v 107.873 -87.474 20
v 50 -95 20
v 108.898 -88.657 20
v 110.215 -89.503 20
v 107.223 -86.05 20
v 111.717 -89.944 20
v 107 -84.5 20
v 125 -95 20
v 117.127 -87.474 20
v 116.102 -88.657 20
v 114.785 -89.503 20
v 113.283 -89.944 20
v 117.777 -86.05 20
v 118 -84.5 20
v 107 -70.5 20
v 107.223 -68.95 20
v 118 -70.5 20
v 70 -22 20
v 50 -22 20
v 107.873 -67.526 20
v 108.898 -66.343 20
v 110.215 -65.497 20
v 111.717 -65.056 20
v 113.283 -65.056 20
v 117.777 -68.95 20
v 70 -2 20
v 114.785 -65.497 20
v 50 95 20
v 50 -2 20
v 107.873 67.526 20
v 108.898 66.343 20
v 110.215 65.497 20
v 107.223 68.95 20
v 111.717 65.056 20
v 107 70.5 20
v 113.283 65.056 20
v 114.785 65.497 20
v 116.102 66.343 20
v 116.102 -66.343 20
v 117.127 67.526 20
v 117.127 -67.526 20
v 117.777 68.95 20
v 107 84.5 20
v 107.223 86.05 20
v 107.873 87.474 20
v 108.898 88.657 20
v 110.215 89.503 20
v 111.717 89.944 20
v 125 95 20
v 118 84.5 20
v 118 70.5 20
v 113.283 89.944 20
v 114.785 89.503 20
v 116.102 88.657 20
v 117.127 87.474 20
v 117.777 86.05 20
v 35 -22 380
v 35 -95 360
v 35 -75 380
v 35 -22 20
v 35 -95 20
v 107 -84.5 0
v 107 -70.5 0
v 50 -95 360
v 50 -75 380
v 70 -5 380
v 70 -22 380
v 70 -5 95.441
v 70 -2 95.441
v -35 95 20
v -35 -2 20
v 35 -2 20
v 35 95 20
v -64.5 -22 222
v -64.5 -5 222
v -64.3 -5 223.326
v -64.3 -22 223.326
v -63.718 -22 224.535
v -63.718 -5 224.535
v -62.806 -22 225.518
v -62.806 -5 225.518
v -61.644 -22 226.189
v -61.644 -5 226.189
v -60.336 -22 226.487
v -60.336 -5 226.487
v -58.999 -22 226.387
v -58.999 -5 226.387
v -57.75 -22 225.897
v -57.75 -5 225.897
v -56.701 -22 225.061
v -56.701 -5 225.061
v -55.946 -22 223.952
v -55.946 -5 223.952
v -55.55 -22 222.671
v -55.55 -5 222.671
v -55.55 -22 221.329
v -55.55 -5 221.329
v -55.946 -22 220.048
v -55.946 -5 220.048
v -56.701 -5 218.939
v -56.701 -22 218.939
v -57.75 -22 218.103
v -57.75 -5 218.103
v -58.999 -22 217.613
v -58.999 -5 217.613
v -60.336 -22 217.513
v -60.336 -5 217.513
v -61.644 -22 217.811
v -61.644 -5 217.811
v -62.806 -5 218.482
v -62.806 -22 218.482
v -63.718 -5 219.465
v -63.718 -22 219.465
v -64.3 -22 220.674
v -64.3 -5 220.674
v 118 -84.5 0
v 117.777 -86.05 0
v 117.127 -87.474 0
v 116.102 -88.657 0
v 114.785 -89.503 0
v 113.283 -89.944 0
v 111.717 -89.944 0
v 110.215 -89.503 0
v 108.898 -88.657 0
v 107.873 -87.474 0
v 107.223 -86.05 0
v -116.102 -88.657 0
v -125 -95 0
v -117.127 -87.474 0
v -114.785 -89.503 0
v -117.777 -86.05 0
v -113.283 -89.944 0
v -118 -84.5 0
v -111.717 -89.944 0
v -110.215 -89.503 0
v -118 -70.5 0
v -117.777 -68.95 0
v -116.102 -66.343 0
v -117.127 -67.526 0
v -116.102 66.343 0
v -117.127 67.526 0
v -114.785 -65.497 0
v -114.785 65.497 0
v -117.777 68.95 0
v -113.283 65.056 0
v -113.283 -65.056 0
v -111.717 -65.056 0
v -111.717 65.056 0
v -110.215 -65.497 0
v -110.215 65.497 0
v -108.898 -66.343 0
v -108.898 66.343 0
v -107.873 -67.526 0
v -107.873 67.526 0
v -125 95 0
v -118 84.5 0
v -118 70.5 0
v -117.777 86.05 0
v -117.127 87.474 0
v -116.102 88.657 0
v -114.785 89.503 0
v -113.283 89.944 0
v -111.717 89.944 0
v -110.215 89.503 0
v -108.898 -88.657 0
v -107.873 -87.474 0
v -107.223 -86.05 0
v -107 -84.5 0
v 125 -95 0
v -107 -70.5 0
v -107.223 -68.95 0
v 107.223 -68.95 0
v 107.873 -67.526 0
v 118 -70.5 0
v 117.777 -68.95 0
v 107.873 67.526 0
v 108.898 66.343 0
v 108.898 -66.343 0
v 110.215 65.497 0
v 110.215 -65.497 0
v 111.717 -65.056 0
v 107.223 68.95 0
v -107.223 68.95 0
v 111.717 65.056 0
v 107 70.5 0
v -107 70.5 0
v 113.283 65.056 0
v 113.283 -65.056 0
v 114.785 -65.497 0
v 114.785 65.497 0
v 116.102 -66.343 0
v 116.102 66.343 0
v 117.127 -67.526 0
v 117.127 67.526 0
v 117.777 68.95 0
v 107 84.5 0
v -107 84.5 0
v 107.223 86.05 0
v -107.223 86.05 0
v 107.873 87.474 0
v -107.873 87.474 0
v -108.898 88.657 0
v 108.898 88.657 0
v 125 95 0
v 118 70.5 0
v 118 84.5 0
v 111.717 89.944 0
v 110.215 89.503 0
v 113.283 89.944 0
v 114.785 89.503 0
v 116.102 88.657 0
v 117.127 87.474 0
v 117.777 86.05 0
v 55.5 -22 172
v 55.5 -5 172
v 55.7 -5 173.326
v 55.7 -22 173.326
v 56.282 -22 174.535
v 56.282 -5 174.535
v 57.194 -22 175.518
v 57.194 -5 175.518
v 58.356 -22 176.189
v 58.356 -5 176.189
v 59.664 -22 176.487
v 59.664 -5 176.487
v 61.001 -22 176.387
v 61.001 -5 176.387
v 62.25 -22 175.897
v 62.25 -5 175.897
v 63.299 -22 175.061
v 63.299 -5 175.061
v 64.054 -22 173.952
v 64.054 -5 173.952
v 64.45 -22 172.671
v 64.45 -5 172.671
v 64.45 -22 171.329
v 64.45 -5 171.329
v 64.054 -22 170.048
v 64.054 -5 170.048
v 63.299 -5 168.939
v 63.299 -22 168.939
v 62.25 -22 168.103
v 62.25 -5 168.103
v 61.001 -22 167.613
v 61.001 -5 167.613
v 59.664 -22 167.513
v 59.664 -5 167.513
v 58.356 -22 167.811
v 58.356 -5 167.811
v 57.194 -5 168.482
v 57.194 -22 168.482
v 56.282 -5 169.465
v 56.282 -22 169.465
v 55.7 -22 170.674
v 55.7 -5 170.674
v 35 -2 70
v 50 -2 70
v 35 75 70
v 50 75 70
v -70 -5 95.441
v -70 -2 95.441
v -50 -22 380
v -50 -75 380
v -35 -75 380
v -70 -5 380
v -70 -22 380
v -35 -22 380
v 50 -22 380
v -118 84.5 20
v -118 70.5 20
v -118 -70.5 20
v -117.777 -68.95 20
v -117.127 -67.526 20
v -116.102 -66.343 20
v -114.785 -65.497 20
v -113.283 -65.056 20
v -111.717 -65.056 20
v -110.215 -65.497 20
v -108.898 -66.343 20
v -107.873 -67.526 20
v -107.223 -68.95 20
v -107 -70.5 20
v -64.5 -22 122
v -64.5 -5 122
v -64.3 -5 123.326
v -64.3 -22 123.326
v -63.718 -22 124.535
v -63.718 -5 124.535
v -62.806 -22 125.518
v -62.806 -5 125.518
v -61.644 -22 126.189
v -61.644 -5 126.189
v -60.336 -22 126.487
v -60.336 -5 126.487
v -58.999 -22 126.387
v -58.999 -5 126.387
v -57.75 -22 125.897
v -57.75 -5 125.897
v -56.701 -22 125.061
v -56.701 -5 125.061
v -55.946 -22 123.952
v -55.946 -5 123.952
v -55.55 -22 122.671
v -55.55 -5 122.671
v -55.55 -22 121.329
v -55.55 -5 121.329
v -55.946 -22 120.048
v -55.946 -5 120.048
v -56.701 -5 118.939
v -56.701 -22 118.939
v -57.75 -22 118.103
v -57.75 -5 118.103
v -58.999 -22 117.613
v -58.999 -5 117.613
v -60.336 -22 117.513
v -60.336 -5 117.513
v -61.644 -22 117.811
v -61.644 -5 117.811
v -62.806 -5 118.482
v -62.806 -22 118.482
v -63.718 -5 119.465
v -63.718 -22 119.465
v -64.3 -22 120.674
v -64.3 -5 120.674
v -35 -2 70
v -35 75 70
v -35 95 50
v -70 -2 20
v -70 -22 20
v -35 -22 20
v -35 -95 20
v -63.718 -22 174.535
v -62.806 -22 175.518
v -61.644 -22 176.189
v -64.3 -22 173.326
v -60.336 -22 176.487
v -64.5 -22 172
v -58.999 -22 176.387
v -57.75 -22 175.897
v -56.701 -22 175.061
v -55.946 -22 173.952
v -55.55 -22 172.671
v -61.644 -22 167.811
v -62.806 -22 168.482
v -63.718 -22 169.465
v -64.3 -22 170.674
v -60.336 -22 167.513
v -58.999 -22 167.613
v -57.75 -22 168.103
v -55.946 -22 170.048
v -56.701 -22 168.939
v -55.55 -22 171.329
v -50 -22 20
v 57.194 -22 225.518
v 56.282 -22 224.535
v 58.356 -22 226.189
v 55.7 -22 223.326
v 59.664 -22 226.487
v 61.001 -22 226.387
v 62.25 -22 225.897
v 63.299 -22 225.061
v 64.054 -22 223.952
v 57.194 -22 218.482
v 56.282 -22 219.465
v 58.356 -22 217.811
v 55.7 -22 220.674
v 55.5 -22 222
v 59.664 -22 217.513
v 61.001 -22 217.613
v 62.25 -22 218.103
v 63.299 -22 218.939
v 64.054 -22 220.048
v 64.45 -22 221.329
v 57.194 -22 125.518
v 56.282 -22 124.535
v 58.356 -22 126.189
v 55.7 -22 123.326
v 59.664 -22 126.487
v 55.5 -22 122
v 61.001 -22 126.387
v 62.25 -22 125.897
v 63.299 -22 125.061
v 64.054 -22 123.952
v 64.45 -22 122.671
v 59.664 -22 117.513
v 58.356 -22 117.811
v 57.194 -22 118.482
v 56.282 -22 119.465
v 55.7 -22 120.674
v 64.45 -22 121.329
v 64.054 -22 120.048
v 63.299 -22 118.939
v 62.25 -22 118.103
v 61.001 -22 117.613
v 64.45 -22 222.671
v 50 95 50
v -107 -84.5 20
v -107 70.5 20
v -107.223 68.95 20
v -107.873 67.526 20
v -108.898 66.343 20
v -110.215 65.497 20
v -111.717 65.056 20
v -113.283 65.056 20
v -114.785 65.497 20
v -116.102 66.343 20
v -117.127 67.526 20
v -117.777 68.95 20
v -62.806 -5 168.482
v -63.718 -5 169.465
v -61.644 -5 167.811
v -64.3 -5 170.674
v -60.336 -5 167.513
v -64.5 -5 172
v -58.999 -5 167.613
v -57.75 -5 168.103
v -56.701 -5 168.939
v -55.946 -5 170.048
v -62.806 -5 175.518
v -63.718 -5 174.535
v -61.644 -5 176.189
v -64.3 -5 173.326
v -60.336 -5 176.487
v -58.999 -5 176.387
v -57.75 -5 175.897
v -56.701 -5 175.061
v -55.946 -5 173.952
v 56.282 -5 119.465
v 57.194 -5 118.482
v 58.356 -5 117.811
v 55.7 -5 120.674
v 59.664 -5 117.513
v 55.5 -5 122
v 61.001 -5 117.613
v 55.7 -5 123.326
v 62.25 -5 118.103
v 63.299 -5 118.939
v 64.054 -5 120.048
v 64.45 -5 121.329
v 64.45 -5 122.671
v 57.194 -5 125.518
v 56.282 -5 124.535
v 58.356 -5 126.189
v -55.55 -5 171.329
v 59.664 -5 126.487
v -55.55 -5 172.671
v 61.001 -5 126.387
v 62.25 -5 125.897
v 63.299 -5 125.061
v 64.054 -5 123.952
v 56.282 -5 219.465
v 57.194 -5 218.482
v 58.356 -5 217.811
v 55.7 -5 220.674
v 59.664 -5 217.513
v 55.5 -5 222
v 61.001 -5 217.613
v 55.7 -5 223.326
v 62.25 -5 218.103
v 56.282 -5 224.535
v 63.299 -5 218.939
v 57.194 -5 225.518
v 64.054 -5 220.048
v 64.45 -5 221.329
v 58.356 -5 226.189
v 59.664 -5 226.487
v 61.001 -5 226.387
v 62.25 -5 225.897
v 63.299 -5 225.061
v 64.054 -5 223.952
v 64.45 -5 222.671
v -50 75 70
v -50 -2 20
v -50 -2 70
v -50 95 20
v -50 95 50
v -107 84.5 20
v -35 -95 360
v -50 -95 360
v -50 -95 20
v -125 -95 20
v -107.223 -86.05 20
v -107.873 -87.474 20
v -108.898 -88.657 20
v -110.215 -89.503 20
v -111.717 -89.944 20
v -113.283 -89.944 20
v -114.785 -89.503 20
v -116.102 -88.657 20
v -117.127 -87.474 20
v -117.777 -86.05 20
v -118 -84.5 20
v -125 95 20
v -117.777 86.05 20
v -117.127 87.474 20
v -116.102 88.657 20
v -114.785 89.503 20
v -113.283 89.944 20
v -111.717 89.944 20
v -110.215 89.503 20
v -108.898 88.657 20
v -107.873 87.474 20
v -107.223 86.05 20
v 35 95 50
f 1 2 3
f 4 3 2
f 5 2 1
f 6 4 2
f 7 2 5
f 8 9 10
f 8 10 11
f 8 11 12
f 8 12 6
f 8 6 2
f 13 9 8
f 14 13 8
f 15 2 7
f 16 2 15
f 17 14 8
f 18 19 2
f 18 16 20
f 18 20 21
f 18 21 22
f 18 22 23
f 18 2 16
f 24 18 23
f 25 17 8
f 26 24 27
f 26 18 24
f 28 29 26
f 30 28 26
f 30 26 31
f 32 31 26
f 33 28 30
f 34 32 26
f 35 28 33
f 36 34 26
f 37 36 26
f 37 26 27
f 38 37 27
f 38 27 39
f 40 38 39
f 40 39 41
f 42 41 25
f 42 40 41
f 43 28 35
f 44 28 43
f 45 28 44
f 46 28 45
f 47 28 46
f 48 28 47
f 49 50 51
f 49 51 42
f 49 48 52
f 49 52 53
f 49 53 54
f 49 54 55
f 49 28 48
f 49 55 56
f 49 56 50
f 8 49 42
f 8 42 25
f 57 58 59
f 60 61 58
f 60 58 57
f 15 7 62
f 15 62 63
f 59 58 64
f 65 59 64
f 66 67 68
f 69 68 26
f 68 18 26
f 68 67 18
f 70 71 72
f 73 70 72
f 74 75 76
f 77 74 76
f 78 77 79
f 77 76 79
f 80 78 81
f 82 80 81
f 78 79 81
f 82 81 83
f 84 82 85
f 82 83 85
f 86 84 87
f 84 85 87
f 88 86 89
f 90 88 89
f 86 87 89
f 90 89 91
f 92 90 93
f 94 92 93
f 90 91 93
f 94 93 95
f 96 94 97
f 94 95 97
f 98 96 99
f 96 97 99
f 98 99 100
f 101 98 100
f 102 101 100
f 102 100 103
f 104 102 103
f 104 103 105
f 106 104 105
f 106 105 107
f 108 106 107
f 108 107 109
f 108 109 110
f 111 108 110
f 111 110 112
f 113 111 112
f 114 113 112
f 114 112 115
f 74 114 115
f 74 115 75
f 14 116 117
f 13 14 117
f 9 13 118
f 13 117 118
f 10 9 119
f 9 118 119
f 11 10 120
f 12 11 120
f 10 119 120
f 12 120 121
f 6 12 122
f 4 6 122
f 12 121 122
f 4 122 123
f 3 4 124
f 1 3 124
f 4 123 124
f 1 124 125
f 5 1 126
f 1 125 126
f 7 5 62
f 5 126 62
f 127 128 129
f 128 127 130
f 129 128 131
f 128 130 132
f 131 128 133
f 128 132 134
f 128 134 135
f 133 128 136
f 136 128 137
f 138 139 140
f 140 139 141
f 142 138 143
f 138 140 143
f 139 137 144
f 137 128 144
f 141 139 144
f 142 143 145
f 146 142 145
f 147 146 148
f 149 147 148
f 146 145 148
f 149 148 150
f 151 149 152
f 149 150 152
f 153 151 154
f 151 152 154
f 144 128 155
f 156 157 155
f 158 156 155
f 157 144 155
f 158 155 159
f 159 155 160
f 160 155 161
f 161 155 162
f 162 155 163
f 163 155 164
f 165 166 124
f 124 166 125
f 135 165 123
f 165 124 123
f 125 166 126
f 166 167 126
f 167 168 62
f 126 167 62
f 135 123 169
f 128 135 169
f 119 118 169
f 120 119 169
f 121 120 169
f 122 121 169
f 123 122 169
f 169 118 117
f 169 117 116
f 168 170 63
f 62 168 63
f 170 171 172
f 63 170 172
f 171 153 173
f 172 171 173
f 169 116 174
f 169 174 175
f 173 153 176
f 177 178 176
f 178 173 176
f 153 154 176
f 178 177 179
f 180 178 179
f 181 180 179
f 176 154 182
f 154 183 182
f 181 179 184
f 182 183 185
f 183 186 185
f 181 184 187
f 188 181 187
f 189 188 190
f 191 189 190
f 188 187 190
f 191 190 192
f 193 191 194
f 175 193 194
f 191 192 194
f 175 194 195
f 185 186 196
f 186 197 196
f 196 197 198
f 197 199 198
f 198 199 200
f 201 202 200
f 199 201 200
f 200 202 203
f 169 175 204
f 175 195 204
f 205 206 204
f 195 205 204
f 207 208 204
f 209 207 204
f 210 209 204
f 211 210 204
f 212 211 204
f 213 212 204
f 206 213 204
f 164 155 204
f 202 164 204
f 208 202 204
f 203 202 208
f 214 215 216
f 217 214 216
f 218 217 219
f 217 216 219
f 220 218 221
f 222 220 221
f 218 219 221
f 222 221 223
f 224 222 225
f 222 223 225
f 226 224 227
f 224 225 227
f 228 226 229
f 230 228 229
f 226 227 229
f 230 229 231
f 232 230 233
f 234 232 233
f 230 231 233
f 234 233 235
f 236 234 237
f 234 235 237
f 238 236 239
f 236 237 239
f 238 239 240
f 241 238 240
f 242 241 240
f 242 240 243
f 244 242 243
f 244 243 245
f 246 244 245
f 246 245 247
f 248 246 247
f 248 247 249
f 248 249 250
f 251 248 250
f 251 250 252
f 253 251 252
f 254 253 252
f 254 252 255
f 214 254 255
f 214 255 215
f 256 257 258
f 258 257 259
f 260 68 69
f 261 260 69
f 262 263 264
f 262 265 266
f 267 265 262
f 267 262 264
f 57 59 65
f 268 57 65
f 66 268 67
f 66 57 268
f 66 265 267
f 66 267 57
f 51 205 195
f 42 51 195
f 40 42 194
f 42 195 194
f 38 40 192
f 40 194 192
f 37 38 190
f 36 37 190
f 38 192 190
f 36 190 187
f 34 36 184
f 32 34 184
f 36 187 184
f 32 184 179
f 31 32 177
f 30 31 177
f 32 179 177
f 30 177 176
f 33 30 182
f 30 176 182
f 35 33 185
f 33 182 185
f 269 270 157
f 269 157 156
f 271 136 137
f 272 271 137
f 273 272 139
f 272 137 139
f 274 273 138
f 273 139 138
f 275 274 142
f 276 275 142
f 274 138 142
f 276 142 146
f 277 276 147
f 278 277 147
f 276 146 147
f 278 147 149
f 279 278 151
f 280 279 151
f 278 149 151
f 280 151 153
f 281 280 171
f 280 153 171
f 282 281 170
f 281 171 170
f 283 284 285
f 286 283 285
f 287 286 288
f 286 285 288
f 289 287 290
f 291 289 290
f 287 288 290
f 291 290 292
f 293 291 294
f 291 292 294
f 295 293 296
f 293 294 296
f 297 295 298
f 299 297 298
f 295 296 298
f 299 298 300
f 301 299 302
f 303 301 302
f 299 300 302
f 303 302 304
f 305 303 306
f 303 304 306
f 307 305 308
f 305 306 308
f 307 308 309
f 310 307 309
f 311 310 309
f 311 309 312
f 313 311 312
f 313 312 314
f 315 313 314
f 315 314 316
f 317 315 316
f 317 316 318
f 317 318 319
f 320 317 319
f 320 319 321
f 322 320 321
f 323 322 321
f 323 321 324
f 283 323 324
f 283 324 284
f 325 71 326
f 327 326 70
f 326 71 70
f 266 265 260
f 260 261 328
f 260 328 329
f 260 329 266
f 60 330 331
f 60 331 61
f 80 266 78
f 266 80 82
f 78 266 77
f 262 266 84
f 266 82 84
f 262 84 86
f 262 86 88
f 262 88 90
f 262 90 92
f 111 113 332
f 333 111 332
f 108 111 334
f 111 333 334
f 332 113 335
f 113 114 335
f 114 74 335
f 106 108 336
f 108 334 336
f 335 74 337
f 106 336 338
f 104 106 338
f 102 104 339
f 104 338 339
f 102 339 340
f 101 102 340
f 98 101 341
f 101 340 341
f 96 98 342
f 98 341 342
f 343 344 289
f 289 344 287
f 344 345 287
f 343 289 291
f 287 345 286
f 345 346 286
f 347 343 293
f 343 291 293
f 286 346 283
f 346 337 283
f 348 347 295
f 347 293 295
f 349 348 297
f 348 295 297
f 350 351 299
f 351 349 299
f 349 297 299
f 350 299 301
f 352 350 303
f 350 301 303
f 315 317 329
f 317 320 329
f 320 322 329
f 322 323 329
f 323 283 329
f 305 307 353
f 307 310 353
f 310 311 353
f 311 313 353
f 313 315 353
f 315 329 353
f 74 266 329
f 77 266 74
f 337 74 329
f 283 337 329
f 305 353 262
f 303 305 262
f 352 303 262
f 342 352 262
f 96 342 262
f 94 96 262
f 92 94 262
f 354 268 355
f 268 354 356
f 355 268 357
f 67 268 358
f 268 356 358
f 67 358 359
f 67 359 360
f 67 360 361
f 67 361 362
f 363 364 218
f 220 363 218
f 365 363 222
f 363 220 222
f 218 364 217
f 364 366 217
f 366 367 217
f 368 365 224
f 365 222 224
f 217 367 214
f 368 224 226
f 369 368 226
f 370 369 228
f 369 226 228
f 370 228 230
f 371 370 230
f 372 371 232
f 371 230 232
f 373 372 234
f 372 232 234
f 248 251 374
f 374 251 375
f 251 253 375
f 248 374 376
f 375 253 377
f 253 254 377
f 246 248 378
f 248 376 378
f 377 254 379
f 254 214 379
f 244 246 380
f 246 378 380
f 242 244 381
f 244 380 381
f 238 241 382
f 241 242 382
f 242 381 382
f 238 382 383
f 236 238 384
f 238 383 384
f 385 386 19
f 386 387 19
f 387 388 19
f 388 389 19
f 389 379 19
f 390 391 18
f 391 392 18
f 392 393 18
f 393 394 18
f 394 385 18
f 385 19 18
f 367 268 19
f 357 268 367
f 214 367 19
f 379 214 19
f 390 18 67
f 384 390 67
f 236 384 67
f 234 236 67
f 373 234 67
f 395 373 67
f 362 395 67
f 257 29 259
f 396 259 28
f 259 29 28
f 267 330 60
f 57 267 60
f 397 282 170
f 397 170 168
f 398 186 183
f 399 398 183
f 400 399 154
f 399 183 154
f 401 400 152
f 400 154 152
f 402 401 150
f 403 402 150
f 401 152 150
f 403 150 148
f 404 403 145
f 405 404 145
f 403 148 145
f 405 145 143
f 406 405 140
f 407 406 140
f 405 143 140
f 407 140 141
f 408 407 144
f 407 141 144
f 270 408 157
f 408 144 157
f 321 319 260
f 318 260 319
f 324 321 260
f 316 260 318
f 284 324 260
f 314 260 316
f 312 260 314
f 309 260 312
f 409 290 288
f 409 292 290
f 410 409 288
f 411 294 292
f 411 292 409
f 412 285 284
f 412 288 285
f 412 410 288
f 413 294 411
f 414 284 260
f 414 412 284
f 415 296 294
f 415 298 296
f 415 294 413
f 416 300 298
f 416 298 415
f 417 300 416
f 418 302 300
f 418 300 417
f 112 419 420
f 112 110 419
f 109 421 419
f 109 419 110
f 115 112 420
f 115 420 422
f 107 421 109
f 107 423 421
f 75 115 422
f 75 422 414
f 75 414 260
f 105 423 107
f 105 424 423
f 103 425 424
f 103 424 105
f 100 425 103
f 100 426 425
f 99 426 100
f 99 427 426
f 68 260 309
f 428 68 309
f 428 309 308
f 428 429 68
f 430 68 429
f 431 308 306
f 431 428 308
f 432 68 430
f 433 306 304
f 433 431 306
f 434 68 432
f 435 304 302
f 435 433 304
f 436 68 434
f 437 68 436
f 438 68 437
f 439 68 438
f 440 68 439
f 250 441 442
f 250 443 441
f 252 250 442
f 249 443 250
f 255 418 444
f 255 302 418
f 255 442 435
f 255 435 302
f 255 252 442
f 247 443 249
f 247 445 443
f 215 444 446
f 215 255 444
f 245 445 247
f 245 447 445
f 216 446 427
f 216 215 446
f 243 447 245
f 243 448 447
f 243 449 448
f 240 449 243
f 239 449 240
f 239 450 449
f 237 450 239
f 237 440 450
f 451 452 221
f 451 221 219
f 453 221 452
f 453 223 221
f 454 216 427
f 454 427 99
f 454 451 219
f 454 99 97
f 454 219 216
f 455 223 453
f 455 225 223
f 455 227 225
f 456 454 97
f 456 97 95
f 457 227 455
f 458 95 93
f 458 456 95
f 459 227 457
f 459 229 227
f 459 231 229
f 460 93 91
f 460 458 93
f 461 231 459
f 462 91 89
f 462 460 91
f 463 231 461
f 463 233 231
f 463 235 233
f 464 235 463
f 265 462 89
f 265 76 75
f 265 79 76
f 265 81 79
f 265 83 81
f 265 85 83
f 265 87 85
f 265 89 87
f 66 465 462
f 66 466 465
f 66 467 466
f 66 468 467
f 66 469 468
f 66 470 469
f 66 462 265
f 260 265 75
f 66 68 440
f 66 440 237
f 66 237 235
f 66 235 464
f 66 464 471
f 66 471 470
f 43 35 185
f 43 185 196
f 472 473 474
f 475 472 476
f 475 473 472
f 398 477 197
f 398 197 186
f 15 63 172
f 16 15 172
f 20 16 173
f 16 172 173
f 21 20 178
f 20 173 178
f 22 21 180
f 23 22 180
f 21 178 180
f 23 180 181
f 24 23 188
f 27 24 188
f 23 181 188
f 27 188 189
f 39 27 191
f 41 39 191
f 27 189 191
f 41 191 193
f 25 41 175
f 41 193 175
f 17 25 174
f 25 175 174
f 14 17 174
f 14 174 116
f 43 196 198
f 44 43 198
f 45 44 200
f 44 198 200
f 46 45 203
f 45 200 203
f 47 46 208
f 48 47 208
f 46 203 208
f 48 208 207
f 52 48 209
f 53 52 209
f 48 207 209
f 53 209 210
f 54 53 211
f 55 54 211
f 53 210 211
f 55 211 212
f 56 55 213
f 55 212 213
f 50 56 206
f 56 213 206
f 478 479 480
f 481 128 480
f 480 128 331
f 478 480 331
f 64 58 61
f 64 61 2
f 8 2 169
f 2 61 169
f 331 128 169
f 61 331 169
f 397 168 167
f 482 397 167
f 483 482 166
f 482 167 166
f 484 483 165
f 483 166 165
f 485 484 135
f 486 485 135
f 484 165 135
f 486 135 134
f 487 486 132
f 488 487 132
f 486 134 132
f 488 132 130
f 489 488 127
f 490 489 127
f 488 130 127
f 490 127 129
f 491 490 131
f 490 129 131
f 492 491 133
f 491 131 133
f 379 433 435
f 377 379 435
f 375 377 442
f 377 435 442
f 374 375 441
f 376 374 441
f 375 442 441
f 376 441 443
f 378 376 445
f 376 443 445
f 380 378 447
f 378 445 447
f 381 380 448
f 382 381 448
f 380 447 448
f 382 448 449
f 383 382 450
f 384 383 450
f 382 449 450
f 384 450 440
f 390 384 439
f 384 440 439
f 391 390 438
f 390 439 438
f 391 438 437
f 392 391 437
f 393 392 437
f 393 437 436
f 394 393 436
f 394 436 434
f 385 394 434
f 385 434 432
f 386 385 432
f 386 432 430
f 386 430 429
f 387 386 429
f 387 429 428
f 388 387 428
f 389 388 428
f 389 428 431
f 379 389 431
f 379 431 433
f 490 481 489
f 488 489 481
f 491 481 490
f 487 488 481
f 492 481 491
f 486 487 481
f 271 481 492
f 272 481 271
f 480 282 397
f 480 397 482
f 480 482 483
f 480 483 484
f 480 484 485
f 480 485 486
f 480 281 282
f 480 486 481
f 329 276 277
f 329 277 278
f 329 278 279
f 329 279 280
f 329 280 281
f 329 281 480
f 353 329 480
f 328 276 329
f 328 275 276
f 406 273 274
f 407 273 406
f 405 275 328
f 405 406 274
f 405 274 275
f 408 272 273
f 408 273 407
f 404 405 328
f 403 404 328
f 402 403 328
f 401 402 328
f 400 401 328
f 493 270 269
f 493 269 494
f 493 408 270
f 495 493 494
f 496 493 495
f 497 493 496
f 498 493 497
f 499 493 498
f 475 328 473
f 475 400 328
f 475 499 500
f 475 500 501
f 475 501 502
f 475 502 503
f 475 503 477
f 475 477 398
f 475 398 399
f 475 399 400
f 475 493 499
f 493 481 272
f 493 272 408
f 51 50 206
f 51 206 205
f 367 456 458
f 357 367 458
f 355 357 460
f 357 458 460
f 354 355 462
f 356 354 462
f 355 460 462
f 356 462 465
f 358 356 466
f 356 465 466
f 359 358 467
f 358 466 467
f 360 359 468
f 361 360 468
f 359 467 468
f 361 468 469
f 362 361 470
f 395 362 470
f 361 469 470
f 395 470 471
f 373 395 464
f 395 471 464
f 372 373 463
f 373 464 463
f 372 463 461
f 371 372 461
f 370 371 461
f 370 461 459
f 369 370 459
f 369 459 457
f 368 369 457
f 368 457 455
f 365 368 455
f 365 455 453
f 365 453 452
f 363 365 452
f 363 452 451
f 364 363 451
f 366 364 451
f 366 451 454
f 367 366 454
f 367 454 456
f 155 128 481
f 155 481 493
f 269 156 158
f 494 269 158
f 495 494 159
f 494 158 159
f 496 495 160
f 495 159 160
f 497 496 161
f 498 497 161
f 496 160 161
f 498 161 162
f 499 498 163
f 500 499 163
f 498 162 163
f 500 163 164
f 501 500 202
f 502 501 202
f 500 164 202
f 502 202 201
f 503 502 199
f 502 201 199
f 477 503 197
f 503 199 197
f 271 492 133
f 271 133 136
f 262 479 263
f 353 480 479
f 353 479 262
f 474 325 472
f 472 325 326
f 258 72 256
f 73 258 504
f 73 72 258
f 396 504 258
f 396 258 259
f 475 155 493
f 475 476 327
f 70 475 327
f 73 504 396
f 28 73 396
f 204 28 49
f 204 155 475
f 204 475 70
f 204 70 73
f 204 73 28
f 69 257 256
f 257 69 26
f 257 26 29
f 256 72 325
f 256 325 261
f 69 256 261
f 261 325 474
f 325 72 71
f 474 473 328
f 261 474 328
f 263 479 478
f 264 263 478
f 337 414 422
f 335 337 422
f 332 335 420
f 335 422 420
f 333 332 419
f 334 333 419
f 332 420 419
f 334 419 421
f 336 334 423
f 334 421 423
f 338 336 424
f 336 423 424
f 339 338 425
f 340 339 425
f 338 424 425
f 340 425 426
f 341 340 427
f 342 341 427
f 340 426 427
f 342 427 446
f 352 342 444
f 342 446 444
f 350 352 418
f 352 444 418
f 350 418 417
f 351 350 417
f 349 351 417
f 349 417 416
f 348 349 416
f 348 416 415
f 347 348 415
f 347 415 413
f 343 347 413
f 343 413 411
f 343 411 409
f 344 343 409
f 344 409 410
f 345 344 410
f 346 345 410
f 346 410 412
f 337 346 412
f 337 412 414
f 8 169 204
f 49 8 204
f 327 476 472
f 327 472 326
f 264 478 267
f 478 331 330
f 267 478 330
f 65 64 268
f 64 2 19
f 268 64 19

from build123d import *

# Parameters (mm, degrees)
F0_W     = 250
F0_H     = 190
F1_DEPTH = 20
F2_W     = 15
F2_H     = 73
F2_H_2   = 97
F3_DEPTH = 360
F4_W     = 3
F4_H     = 284.5591875911
F5_DEPTH = 140
F6_SIZE  = 20
F8_D     = 9


with BuildPart() as f1:
    # F0 (on Top) → F1 (new body)
    with BuildSketch(Plane.XY):
        Rectangle(F0_W, F0_H)
        with BuildLine():
            ThreePointArc((-107, -84.5), (-112.5, -90), (-118, -84.5))
            Line((-118, -84.5), (-118, -70.5))
            ThreePointArc((-118, -70.5), (-112.5, -65), (-107, -70.5))
            Line((-107, -70.5), (-107, -84.5))
        make_face(mode=Mode.SUBTRACT)
        with BuildLine():
            ThreePointArc((118, -84.5), (112.5, -90), (107, -84.5))
            Line((107, -84.5), (107, -70.5))
            ThreePointArc((107, -70.5), (112.5, -65), (118, -70.5))
            Line((118, -70.5), (118, -84.5))
        make_face(mode=Mode.SUBTRACT)
        with BuildLine():
            ThreePointArc((-118, 84.5), (-112.5, 90), (-107, 84.5))
            Line((-107, 84.5), (-107, 70.5))
            ThreePointArc((-107, 70.5), (-112.5, 65), (-118, 70.5))
            Line((-118, 70.5), (-118, 84.5))
        make_face(mode=Mode.SUBTRACT)
        with BuildLine():
            ThreePointArc((118, 70.5), (112.5, 65), (107, 70.5))
            Line((107, 70.5), (107, 84.5))
            ThreePointArc((107, 84.5), (112.5, 90), (118, 84.5))
            Line((118, 84.5), (118, 70.5))
        make_face(mode=Mode.SUBTRACT)
    extrude(amount=F1_DEPTH)

    # F2 (on face) → F3 (join)
    with BuildSketch(Plane.XY.offset(20)):
        with Locations((-42.5, -58.5)):
            Rectangle(F2_W, F2_H)
        with Locations((42.5, -58.5)):
            Rectangle(F2_W, F2_H)
        Polygon((-70, -22), (-50, -22), (-35, -22), (35, -22), (50, -22), (70, -22), (70, -2), (50, -2), (35, -2), (-35, -2), (-50, -2), (-70, -2), align=None)
        with Locations((42.5, 46.5)):
            Rectangle(F2_W, F2_H_2)
        with Locations((-42.5, 46.5)):
            Rectangle(F2_W, F2_H_2)
    extrude(amount=F3_DEPTH)

    # F4 (on face) → F5 (cut, symmetric)
    with BuildSketch(Plane.YZ.offset(50)):
        Polygon((-2, 70), (95, 70), (95, 380), (-2, 380), (-2, 95.4408124089), align=None)
        with Locations((-3.5, 237.7204062045)):
            Rectangle(F4_W, F4_H)
    extrude(amount=F5_DEPTH, both=True, mode=Mode.SUBTRACT)

    # F6
    f6_edges = [f1.edges().sort_by_distance(p)[0] for p in [
        (42.5, -95, 380),
        (-42.5, -95, 380),
        (42.5, 95, 70),
        (-42.5, 95, 70),
    ]]
    chamfer(f6_edges, length=F6_SIZE)

    # F8 (through all)
    with Locations(Plane.XZ.offset(22)):
        with Locations((-60, 222), (-60, 172), (-60, 122), (60, 222), (60, 172), (60, 122)):
            Hole(F8_D / 2)


solid = f1.part
